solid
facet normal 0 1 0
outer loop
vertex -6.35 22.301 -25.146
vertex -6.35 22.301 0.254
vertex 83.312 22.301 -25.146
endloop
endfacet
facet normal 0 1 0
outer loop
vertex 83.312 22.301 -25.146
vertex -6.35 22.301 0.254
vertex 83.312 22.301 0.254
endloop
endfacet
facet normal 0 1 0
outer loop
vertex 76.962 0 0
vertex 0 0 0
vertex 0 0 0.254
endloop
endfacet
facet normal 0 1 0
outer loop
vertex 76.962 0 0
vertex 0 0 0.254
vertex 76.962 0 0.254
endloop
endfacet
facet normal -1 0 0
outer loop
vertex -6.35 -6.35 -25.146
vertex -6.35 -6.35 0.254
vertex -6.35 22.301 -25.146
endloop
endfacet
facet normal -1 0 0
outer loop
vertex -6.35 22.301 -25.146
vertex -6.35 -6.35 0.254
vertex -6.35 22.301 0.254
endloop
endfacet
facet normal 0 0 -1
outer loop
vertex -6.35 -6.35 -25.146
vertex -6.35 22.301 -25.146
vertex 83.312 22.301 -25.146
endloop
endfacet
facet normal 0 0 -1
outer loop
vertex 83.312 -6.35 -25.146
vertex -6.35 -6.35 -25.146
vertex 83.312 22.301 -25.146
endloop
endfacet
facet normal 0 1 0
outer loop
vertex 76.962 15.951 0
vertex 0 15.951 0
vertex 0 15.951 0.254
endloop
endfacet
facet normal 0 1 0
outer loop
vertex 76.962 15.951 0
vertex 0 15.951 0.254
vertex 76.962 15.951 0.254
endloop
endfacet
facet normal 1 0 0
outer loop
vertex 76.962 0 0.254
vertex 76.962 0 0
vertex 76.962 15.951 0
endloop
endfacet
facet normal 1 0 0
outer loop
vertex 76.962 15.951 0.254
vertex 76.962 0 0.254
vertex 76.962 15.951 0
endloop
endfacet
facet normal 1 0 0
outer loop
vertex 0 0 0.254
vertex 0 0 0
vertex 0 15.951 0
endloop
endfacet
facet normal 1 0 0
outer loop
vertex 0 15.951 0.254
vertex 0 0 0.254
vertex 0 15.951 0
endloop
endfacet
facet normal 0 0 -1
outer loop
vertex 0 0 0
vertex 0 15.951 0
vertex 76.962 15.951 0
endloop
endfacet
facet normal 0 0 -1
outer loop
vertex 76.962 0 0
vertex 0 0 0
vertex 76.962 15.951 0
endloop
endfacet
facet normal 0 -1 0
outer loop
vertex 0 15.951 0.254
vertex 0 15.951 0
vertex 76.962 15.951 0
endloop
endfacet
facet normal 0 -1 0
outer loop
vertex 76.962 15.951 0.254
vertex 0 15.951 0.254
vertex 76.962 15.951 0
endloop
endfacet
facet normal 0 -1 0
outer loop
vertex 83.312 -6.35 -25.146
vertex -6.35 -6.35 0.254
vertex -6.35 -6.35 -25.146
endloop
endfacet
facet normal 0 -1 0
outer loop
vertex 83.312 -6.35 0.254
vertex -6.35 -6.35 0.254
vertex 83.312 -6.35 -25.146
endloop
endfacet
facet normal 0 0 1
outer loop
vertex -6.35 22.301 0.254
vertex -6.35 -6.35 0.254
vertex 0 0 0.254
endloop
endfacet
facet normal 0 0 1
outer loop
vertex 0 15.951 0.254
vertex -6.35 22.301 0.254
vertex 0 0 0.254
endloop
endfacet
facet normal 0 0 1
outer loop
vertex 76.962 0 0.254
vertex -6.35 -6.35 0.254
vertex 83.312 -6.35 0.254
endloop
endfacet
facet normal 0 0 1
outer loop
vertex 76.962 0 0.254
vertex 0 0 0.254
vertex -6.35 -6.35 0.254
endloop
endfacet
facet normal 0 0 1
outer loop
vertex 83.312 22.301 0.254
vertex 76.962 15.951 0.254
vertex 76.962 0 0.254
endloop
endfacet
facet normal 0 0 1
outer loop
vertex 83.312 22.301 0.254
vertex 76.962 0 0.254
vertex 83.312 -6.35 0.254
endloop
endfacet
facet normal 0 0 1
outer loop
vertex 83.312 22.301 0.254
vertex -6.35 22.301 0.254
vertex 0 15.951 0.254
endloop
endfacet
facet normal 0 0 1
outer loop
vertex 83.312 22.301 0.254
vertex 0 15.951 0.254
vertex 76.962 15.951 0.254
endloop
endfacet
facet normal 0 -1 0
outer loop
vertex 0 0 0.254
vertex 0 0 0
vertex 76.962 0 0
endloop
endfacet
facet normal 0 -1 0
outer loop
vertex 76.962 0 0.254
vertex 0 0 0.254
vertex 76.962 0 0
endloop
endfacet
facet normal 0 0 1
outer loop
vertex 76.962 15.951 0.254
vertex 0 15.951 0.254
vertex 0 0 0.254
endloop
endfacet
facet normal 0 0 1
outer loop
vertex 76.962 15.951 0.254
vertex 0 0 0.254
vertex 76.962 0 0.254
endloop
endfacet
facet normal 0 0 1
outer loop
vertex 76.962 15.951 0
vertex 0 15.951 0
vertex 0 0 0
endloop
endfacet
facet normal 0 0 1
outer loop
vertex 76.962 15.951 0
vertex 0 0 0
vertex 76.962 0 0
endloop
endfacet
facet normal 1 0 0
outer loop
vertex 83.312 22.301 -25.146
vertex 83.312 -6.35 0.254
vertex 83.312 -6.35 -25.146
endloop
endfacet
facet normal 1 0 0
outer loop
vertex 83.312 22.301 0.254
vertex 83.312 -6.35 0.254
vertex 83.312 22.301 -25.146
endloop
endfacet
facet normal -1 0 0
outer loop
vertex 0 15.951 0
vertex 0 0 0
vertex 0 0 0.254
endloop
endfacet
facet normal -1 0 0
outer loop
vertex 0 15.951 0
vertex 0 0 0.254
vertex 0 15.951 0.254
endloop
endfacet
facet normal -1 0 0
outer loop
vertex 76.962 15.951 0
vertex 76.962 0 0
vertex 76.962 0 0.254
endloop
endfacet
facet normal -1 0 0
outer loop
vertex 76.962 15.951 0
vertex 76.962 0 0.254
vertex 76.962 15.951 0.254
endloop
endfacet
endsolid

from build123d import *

# Parameters (mm, degrees)
F0_W     = 76.962
F0_H     = 15.9512
F1_DEPTH = 0.254
F3_W     = 89.6620015546
F3_H     = 28.6512015546
F3_W_2   = 76.962
F3_H_2   = 15.9512
F4_DEPTH = 25.4


with BuildPart() as f1:
    # F0 (on Top) → F1 (new body)
    with BuildSketch(Plane.XY):
        with Locations((38.481, 7.9756)):
            Rectangle(F0_W, F0_H)
    extrude(amount=F1_DEPTH)


with BuildPart() as f4:
    # F3 (on offset) → F4 (new body)
    with BuildSketch(Plane.XY.offset(0.254)):
        with Locations((38.481, 7.9756)):
            Rectangle(F3_W, F3_H)
        with Locations((38.481, 7.9756)):
            Rectangle(F3_W_2, F3_H_2, mode=Mode.SUBTRACT)
        with Locations((38.481, 7.9756)):
            Rectangle(F3_W_2, F3_H_2)
    extrude(amount=-F4_DEPTH)

    # F5: cut F1
    add(f1.part, mode=Mode.SUBTRACT)


solid = Compound([f1.part, f4.part])
